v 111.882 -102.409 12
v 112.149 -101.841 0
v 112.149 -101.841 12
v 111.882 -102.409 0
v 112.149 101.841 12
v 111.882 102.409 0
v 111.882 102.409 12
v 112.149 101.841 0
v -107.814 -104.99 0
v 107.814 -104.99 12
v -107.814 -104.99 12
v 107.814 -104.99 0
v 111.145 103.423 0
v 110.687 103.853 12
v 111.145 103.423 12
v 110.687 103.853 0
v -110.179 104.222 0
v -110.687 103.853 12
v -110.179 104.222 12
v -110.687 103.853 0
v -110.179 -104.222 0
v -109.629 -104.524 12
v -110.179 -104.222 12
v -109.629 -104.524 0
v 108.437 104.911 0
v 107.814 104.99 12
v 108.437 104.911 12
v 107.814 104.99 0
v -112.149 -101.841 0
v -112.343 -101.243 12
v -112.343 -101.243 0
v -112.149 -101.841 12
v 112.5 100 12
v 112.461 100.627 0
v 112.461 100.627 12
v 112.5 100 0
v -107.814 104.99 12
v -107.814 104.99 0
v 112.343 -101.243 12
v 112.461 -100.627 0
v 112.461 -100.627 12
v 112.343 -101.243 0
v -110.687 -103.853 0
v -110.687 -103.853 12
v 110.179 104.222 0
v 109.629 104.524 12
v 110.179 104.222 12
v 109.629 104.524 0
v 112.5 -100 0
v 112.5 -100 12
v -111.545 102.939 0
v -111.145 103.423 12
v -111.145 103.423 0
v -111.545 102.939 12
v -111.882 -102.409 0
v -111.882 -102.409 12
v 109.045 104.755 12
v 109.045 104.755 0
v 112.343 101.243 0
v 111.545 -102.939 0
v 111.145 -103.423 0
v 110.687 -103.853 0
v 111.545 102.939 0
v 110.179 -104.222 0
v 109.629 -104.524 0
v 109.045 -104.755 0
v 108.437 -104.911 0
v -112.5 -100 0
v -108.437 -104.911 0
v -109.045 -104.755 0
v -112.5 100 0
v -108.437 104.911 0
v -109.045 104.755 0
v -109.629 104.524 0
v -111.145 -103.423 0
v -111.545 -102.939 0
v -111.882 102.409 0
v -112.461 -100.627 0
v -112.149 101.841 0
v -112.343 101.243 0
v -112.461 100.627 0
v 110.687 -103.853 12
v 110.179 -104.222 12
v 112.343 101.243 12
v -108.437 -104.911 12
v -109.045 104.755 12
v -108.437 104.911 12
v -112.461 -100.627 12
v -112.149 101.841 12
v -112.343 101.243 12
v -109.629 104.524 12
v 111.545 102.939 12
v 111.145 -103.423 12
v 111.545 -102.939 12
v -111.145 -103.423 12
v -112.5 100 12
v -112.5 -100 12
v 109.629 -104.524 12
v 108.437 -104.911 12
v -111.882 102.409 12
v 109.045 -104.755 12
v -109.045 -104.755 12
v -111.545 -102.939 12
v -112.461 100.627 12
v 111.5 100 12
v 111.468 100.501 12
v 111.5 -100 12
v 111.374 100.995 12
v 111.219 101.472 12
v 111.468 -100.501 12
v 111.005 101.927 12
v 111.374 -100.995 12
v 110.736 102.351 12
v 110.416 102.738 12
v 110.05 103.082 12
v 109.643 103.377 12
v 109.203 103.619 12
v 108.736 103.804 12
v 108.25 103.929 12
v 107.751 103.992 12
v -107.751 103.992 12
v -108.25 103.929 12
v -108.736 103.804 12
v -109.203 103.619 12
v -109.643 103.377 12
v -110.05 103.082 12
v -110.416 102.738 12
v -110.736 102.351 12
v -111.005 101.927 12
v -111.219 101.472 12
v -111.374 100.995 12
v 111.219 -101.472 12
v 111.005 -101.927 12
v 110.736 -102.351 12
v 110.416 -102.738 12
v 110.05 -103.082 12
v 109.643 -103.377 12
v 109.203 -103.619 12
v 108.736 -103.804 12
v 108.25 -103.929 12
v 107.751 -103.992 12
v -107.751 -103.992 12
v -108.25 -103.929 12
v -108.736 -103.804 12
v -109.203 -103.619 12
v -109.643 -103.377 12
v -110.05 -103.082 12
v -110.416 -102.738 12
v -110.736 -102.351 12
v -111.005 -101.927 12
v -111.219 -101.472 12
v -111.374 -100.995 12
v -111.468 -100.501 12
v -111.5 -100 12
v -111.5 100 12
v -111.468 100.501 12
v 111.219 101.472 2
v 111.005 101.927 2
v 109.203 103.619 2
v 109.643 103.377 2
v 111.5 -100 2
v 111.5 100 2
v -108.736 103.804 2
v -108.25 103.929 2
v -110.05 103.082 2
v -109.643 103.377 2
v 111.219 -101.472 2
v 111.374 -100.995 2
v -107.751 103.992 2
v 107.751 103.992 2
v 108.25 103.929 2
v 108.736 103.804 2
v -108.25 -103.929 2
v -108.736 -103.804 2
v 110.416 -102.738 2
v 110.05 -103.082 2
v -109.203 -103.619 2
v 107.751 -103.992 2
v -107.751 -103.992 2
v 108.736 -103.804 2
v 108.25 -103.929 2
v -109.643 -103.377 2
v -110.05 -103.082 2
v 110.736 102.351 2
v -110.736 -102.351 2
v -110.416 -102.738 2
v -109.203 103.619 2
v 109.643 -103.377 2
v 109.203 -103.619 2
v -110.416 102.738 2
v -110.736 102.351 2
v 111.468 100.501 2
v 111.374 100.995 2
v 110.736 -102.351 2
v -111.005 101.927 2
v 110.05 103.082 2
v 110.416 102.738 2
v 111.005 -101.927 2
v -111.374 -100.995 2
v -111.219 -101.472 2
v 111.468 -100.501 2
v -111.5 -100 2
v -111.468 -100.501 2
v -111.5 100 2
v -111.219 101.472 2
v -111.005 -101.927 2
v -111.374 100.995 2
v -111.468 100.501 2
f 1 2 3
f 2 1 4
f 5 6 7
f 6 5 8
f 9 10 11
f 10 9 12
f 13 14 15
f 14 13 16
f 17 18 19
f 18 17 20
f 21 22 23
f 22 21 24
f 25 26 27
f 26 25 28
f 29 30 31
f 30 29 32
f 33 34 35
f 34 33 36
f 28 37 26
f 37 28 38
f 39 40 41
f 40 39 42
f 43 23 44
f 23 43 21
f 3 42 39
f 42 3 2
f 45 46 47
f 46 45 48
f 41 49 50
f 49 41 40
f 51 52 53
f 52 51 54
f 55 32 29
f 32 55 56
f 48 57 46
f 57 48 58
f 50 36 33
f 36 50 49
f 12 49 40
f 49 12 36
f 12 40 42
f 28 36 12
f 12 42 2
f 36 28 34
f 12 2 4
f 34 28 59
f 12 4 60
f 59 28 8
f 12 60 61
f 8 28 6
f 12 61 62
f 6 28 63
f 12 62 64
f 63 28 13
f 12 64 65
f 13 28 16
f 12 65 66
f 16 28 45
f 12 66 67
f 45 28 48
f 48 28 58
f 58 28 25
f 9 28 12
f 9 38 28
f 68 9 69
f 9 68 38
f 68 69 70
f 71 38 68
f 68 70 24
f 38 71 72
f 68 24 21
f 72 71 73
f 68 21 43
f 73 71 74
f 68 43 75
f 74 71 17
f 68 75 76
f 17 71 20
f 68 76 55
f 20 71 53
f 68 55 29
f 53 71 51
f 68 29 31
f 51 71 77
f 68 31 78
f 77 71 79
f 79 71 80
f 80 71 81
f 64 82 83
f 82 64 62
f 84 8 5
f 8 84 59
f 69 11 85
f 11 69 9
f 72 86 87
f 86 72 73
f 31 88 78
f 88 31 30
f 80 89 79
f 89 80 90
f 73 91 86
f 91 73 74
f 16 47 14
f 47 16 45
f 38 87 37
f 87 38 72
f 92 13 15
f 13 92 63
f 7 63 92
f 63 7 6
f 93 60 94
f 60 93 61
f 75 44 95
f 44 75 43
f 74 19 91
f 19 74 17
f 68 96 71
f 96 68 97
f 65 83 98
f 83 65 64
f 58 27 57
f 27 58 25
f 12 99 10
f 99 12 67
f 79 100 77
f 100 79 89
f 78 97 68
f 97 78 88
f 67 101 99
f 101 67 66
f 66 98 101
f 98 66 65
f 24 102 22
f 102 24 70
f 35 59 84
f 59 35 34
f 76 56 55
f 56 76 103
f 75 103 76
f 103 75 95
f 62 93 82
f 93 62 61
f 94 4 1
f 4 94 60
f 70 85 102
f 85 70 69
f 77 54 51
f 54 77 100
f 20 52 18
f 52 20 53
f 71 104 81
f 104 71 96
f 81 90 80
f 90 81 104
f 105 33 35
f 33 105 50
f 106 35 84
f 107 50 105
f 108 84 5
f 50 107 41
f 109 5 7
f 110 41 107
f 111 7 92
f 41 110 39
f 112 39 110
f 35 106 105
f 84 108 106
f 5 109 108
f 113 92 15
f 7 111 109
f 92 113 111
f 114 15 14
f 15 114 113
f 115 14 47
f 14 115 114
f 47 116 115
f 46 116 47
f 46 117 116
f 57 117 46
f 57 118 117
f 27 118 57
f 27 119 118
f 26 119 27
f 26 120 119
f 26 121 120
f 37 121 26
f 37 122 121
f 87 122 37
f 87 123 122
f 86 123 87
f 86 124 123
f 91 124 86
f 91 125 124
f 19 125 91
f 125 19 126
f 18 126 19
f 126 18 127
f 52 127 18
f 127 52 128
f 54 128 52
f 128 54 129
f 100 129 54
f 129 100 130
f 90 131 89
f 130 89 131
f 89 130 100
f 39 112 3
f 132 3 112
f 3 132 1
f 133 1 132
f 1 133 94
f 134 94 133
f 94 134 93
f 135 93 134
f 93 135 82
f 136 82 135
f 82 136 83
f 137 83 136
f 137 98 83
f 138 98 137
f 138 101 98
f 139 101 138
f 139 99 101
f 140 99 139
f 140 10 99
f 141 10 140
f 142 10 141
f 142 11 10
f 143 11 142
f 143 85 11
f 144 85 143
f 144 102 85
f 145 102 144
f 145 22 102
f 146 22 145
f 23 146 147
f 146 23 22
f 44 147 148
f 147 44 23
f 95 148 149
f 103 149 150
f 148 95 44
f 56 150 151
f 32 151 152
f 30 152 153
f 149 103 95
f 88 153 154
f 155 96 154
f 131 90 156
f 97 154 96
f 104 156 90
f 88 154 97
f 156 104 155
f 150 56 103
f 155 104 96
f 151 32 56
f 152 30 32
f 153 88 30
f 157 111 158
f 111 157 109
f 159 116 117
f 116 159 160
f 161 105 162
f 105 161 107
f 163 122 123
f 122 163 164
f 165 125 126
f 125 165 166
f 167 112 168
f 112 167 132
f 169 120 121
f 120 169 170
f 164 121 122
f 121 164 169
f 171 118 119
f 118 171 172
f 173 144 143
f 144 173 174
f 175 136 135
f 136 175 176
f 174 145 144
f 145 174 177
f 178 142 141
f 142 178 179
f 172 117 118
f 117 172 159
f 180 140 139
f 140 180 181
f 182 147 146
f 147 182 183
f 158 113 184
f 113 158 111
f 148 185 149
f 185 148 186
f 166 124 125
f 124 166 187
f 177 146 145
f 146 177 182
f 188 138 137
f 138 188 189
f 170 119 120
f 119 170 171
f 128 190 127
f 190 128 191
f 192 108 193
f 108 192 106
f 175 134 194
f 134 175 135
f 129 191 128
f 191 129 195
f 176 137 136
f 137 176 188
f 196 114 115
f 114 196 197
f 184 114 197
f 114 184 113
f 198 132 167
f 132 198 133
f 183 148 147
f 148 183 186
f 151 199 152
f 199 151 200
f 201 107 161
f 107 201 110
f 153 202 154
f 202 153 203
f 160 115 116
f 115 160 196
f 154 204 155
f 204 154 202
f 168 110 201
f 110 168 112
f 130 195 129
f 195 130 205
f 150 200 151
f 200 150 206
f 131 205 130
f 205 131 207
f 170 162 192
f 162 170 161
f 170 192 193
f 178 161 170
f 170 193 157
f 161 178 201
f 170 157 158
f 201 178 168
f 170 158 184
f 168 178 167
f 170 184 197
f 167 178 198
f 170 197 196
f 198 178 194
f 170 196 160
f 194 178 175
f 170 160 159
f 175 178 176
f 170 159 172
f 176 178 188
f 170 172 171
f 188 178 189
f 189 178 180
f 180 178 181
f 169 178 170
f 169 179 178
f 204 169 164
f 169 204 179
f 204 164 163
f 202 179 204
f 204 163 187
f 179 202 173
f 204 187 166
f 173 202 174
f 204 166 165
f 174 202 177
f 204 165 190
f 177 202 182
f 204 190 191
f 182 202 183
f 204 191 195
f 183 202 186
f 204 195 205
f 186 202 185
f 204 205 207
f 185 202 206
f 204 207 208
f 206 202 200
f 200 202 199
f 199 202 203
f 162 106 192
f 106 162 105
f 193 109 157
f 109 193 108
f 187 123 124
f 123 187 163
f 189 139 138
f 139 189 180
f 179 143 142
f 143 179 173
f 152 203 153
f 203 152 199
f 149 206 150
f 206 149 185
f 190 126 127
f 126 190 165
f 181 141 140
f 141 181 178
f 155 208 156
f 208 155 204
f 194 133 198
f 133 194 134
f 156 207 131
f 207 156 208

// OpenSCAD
$fn = 50;


difference() {
	union() {
		hull() {
			translate(v = [-107.5000000000, 100.0000000000, 0]) {
				cylinder(h = 12, r = 5);
			}
			translate(v = [107.5000000000, 100.0000000000, 0]) {
				cylinder(h = 12, r = 5);
			}
			translate(v = [-107.5000000000, -100.0000000000, 0]) {
				cylinder(h = 12, r = 5);
			}
			translate(v = [107.5000000000, -100.0000000000, 0]) {
				cylinder(h = 12, r = 5);
			}
		}
	}
	union() {
		translate(v = [0, 0, 2]) {
			hull() {
				translate(v = [-107.5000000000, 100.0000000000, 0]) {
					cylinder(h = 10, r = 4);
				}
				translate(v = [107.5000000000, 100.0000000000, 0]) {
					cylinder(h = 10, r = 4);
				}
				translate(v = [-107.5000000000, -100.0000000000, 0]) {
					cylinder(h = 10, r = 4);
				}
				translate(v = [107.5000000000, -100.0000000000, 0]) {
					cylinder(h = 10, r = 4);
				}
			}
		}
	}
}
